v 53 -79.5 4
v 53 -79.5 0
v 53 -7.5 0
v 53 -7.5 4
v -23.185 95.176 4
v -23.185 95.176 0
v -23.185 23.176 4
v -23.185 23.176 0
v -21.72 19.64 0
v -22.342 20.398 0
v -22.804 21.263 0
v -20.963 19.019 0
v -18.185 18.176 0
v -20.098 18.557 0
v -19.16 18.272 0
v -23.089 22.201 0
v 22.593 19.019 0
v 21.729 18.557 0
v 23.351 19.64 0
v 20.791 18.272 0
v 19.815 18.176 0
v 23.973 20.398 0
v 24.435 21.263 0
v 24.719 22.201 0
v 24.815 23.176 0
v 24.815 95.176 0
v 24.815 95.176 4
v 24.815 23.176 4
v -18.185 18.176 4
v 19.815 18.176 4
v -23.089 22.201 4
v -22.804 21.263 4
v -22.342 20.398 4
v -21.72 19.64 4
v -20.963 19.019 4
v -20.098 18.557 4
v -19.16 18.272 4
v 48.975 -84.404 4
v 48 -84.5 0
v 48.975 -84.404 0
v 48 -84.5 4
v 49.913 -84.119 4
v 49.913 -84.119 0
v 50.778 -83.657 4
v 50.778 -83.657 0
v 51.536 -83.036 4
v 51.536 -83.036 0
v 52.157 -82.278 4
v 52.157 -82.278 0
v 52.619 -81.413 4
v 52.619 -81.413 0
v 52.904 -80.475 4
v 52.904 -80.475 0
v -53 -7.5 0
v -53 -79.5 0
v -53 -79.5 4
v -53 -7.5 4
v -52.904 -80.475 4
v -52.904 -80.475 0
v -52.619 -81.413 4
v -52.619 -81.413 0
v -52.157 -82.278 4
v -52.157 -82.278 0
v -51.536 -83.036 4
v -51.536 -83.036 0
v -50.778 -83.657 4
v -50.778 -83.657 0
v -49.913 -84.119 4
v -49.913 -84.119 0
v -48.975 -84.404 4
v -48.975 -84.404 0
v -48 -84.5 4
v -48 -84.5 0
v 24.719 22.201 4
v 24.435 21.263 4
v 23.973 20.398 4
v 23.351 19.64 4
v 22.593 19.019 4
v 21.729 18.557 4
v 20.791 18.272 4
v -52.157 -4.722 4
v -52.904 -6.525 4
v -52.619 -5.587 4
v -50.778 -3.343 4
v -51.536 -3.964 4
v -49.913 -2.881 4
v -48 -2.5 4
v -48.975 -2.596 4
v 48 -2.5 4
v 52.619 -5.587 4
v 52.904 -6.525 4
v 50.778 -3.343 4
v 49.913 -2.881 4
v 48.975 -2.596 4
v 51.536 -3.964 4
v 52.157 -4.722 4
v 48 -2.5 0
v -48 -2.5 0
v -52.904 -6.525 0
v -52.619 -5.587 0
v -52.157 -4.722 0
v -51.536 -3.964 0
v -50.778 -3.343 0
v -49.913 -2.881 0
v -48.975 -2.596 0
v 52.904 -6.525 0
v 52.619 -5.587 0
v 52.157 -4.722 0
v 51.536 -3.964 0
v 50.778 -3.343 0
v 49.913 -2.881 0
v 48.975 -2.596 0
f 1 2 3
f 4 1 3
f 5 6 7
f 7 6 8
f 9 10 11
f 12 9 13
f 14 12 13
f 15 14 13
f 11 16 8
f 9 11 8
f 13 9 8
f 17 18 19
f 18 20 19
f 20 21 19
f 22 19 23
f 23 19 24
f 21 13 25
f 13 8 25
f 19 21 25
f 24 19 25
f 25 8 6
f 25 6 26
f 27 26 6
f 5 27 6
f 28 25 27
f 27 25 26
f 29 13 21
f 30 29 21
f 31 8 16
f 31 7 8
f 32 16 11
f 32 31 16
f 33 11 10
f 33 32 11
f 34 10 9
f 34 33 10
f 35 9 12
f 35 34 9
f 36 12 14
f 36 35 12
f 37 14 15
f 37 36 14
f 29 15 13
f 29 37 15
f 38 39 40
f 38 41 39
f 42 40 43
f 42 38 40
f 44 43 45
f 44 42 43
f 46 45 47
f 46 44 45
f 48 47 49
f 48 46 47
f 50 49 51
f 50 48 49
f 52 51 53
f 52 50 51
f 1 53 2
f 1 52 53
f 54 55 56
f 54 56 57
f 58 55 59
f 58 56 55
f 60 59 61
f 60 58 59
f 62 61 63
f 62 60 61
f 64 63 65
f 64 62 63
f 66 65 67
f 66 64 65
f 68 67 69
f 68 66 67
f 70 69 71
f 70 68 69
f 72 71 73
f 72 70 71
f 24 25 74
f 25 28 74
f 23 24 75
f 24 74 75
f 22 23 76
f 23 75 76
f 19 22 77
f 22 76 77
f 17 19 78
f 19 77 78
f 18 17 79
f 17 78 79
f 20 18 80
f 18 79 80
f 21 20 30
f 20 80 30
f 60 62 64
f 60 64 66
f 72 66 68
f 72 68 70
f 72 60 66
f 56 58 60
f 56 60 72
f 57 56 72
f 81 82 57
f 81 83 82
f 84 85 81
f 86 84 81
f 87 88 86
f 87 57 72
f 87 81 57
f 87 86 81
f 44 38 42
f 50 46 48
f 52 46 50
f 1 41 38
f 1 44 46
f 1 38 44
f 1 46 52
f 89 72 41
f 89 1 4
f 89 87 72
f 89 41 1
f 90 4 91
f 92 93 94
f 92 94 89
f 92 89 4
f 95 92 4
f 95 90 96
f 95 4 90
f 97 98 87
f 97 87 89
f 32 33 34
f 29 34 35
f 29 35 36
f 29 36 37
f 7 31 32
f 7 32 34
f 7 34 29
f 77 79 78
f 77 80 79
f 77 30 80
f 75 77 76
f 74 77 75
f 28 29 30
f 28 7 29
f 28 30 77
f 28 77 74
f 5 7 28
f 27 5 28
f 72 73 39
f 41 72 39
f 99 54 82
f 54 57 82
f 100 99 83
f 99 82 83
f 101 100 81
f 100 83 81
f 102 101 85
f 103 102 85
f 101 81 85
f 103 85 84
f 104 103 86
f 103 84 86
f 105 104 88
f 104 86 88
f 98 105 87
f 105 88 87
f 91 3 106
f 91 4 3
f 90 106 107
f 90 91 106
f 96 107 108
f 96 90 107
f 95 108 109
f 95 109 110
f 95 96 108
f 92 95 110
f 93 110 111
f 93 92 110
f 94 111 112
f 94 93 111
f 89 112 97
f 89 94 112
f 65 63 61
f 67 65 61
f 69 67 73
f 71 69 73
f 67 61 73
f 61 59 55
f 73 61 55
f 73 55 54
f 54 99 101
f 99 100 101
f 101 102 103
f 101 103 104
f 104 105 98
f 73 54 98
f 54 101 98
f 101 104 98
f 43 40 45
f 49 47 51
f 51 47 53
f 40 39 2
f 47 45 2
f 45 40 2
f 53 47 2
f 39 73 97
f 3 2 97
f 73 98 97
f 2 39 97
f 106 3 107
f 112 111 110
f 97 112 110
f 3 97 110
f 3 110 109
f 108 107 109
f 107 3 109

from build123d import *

# Parameters (mm, degrees)
F0_W     = 106
F0_H     = 82
F2_DEPTH = 4
F3_R     = 5
F3_2_R   = 5


# Not quite as in the source:
# - a feature names something its author has since deleted; it is built from what else it names


with BuildPart() as f2:
    # F0 (on Top) → F2 (new body)
    with BuildSketch(Plane.XY):
        with Locations((0, -43.5)):
            Rectangle(F0_W, F0_H)
    extrude(amount=F2_DEPTH)

    # F3
    f3_edges = [f2.edges().sort_by_distance(p)[0] for p in [
        (53, -84.5, 2),
        (-53, -84.5, 2),
        (-53, -2.5, 2),
        (53, -2.5, 2),
    ]]
    fillet(f3_edges, radius=F3_R)


with BuildPart() as f2b:
    # F1 (on Top) → F2, piece 2 (new body)
    with BuildSketch(Plane.XY):
        Polygon((24.8151908007, 18.1759698881), (24.8151908007, 95.1759698881), (-23.1848091993, 95.1759698881), (-23.1848091993, 88.1759698881), (-23.1848091993, 18.1759698881), (-4.1848091993, 18.1759698881), (5.8151908007, 18.1759698881), align=None)
    extrude(amount=F2_DEPTH)

    # F3#2
    f3_2_edges = [f2b.edges().sort_by_distance(p)[0] for p in [
        (-23.184809, 18.17597, 2),
        (24.815191, 18.17597, 2),
    ]]
    fillet(f3_2_edges, radius=F3_2_R)


solid = Compound([f2.part, f2b.part])
